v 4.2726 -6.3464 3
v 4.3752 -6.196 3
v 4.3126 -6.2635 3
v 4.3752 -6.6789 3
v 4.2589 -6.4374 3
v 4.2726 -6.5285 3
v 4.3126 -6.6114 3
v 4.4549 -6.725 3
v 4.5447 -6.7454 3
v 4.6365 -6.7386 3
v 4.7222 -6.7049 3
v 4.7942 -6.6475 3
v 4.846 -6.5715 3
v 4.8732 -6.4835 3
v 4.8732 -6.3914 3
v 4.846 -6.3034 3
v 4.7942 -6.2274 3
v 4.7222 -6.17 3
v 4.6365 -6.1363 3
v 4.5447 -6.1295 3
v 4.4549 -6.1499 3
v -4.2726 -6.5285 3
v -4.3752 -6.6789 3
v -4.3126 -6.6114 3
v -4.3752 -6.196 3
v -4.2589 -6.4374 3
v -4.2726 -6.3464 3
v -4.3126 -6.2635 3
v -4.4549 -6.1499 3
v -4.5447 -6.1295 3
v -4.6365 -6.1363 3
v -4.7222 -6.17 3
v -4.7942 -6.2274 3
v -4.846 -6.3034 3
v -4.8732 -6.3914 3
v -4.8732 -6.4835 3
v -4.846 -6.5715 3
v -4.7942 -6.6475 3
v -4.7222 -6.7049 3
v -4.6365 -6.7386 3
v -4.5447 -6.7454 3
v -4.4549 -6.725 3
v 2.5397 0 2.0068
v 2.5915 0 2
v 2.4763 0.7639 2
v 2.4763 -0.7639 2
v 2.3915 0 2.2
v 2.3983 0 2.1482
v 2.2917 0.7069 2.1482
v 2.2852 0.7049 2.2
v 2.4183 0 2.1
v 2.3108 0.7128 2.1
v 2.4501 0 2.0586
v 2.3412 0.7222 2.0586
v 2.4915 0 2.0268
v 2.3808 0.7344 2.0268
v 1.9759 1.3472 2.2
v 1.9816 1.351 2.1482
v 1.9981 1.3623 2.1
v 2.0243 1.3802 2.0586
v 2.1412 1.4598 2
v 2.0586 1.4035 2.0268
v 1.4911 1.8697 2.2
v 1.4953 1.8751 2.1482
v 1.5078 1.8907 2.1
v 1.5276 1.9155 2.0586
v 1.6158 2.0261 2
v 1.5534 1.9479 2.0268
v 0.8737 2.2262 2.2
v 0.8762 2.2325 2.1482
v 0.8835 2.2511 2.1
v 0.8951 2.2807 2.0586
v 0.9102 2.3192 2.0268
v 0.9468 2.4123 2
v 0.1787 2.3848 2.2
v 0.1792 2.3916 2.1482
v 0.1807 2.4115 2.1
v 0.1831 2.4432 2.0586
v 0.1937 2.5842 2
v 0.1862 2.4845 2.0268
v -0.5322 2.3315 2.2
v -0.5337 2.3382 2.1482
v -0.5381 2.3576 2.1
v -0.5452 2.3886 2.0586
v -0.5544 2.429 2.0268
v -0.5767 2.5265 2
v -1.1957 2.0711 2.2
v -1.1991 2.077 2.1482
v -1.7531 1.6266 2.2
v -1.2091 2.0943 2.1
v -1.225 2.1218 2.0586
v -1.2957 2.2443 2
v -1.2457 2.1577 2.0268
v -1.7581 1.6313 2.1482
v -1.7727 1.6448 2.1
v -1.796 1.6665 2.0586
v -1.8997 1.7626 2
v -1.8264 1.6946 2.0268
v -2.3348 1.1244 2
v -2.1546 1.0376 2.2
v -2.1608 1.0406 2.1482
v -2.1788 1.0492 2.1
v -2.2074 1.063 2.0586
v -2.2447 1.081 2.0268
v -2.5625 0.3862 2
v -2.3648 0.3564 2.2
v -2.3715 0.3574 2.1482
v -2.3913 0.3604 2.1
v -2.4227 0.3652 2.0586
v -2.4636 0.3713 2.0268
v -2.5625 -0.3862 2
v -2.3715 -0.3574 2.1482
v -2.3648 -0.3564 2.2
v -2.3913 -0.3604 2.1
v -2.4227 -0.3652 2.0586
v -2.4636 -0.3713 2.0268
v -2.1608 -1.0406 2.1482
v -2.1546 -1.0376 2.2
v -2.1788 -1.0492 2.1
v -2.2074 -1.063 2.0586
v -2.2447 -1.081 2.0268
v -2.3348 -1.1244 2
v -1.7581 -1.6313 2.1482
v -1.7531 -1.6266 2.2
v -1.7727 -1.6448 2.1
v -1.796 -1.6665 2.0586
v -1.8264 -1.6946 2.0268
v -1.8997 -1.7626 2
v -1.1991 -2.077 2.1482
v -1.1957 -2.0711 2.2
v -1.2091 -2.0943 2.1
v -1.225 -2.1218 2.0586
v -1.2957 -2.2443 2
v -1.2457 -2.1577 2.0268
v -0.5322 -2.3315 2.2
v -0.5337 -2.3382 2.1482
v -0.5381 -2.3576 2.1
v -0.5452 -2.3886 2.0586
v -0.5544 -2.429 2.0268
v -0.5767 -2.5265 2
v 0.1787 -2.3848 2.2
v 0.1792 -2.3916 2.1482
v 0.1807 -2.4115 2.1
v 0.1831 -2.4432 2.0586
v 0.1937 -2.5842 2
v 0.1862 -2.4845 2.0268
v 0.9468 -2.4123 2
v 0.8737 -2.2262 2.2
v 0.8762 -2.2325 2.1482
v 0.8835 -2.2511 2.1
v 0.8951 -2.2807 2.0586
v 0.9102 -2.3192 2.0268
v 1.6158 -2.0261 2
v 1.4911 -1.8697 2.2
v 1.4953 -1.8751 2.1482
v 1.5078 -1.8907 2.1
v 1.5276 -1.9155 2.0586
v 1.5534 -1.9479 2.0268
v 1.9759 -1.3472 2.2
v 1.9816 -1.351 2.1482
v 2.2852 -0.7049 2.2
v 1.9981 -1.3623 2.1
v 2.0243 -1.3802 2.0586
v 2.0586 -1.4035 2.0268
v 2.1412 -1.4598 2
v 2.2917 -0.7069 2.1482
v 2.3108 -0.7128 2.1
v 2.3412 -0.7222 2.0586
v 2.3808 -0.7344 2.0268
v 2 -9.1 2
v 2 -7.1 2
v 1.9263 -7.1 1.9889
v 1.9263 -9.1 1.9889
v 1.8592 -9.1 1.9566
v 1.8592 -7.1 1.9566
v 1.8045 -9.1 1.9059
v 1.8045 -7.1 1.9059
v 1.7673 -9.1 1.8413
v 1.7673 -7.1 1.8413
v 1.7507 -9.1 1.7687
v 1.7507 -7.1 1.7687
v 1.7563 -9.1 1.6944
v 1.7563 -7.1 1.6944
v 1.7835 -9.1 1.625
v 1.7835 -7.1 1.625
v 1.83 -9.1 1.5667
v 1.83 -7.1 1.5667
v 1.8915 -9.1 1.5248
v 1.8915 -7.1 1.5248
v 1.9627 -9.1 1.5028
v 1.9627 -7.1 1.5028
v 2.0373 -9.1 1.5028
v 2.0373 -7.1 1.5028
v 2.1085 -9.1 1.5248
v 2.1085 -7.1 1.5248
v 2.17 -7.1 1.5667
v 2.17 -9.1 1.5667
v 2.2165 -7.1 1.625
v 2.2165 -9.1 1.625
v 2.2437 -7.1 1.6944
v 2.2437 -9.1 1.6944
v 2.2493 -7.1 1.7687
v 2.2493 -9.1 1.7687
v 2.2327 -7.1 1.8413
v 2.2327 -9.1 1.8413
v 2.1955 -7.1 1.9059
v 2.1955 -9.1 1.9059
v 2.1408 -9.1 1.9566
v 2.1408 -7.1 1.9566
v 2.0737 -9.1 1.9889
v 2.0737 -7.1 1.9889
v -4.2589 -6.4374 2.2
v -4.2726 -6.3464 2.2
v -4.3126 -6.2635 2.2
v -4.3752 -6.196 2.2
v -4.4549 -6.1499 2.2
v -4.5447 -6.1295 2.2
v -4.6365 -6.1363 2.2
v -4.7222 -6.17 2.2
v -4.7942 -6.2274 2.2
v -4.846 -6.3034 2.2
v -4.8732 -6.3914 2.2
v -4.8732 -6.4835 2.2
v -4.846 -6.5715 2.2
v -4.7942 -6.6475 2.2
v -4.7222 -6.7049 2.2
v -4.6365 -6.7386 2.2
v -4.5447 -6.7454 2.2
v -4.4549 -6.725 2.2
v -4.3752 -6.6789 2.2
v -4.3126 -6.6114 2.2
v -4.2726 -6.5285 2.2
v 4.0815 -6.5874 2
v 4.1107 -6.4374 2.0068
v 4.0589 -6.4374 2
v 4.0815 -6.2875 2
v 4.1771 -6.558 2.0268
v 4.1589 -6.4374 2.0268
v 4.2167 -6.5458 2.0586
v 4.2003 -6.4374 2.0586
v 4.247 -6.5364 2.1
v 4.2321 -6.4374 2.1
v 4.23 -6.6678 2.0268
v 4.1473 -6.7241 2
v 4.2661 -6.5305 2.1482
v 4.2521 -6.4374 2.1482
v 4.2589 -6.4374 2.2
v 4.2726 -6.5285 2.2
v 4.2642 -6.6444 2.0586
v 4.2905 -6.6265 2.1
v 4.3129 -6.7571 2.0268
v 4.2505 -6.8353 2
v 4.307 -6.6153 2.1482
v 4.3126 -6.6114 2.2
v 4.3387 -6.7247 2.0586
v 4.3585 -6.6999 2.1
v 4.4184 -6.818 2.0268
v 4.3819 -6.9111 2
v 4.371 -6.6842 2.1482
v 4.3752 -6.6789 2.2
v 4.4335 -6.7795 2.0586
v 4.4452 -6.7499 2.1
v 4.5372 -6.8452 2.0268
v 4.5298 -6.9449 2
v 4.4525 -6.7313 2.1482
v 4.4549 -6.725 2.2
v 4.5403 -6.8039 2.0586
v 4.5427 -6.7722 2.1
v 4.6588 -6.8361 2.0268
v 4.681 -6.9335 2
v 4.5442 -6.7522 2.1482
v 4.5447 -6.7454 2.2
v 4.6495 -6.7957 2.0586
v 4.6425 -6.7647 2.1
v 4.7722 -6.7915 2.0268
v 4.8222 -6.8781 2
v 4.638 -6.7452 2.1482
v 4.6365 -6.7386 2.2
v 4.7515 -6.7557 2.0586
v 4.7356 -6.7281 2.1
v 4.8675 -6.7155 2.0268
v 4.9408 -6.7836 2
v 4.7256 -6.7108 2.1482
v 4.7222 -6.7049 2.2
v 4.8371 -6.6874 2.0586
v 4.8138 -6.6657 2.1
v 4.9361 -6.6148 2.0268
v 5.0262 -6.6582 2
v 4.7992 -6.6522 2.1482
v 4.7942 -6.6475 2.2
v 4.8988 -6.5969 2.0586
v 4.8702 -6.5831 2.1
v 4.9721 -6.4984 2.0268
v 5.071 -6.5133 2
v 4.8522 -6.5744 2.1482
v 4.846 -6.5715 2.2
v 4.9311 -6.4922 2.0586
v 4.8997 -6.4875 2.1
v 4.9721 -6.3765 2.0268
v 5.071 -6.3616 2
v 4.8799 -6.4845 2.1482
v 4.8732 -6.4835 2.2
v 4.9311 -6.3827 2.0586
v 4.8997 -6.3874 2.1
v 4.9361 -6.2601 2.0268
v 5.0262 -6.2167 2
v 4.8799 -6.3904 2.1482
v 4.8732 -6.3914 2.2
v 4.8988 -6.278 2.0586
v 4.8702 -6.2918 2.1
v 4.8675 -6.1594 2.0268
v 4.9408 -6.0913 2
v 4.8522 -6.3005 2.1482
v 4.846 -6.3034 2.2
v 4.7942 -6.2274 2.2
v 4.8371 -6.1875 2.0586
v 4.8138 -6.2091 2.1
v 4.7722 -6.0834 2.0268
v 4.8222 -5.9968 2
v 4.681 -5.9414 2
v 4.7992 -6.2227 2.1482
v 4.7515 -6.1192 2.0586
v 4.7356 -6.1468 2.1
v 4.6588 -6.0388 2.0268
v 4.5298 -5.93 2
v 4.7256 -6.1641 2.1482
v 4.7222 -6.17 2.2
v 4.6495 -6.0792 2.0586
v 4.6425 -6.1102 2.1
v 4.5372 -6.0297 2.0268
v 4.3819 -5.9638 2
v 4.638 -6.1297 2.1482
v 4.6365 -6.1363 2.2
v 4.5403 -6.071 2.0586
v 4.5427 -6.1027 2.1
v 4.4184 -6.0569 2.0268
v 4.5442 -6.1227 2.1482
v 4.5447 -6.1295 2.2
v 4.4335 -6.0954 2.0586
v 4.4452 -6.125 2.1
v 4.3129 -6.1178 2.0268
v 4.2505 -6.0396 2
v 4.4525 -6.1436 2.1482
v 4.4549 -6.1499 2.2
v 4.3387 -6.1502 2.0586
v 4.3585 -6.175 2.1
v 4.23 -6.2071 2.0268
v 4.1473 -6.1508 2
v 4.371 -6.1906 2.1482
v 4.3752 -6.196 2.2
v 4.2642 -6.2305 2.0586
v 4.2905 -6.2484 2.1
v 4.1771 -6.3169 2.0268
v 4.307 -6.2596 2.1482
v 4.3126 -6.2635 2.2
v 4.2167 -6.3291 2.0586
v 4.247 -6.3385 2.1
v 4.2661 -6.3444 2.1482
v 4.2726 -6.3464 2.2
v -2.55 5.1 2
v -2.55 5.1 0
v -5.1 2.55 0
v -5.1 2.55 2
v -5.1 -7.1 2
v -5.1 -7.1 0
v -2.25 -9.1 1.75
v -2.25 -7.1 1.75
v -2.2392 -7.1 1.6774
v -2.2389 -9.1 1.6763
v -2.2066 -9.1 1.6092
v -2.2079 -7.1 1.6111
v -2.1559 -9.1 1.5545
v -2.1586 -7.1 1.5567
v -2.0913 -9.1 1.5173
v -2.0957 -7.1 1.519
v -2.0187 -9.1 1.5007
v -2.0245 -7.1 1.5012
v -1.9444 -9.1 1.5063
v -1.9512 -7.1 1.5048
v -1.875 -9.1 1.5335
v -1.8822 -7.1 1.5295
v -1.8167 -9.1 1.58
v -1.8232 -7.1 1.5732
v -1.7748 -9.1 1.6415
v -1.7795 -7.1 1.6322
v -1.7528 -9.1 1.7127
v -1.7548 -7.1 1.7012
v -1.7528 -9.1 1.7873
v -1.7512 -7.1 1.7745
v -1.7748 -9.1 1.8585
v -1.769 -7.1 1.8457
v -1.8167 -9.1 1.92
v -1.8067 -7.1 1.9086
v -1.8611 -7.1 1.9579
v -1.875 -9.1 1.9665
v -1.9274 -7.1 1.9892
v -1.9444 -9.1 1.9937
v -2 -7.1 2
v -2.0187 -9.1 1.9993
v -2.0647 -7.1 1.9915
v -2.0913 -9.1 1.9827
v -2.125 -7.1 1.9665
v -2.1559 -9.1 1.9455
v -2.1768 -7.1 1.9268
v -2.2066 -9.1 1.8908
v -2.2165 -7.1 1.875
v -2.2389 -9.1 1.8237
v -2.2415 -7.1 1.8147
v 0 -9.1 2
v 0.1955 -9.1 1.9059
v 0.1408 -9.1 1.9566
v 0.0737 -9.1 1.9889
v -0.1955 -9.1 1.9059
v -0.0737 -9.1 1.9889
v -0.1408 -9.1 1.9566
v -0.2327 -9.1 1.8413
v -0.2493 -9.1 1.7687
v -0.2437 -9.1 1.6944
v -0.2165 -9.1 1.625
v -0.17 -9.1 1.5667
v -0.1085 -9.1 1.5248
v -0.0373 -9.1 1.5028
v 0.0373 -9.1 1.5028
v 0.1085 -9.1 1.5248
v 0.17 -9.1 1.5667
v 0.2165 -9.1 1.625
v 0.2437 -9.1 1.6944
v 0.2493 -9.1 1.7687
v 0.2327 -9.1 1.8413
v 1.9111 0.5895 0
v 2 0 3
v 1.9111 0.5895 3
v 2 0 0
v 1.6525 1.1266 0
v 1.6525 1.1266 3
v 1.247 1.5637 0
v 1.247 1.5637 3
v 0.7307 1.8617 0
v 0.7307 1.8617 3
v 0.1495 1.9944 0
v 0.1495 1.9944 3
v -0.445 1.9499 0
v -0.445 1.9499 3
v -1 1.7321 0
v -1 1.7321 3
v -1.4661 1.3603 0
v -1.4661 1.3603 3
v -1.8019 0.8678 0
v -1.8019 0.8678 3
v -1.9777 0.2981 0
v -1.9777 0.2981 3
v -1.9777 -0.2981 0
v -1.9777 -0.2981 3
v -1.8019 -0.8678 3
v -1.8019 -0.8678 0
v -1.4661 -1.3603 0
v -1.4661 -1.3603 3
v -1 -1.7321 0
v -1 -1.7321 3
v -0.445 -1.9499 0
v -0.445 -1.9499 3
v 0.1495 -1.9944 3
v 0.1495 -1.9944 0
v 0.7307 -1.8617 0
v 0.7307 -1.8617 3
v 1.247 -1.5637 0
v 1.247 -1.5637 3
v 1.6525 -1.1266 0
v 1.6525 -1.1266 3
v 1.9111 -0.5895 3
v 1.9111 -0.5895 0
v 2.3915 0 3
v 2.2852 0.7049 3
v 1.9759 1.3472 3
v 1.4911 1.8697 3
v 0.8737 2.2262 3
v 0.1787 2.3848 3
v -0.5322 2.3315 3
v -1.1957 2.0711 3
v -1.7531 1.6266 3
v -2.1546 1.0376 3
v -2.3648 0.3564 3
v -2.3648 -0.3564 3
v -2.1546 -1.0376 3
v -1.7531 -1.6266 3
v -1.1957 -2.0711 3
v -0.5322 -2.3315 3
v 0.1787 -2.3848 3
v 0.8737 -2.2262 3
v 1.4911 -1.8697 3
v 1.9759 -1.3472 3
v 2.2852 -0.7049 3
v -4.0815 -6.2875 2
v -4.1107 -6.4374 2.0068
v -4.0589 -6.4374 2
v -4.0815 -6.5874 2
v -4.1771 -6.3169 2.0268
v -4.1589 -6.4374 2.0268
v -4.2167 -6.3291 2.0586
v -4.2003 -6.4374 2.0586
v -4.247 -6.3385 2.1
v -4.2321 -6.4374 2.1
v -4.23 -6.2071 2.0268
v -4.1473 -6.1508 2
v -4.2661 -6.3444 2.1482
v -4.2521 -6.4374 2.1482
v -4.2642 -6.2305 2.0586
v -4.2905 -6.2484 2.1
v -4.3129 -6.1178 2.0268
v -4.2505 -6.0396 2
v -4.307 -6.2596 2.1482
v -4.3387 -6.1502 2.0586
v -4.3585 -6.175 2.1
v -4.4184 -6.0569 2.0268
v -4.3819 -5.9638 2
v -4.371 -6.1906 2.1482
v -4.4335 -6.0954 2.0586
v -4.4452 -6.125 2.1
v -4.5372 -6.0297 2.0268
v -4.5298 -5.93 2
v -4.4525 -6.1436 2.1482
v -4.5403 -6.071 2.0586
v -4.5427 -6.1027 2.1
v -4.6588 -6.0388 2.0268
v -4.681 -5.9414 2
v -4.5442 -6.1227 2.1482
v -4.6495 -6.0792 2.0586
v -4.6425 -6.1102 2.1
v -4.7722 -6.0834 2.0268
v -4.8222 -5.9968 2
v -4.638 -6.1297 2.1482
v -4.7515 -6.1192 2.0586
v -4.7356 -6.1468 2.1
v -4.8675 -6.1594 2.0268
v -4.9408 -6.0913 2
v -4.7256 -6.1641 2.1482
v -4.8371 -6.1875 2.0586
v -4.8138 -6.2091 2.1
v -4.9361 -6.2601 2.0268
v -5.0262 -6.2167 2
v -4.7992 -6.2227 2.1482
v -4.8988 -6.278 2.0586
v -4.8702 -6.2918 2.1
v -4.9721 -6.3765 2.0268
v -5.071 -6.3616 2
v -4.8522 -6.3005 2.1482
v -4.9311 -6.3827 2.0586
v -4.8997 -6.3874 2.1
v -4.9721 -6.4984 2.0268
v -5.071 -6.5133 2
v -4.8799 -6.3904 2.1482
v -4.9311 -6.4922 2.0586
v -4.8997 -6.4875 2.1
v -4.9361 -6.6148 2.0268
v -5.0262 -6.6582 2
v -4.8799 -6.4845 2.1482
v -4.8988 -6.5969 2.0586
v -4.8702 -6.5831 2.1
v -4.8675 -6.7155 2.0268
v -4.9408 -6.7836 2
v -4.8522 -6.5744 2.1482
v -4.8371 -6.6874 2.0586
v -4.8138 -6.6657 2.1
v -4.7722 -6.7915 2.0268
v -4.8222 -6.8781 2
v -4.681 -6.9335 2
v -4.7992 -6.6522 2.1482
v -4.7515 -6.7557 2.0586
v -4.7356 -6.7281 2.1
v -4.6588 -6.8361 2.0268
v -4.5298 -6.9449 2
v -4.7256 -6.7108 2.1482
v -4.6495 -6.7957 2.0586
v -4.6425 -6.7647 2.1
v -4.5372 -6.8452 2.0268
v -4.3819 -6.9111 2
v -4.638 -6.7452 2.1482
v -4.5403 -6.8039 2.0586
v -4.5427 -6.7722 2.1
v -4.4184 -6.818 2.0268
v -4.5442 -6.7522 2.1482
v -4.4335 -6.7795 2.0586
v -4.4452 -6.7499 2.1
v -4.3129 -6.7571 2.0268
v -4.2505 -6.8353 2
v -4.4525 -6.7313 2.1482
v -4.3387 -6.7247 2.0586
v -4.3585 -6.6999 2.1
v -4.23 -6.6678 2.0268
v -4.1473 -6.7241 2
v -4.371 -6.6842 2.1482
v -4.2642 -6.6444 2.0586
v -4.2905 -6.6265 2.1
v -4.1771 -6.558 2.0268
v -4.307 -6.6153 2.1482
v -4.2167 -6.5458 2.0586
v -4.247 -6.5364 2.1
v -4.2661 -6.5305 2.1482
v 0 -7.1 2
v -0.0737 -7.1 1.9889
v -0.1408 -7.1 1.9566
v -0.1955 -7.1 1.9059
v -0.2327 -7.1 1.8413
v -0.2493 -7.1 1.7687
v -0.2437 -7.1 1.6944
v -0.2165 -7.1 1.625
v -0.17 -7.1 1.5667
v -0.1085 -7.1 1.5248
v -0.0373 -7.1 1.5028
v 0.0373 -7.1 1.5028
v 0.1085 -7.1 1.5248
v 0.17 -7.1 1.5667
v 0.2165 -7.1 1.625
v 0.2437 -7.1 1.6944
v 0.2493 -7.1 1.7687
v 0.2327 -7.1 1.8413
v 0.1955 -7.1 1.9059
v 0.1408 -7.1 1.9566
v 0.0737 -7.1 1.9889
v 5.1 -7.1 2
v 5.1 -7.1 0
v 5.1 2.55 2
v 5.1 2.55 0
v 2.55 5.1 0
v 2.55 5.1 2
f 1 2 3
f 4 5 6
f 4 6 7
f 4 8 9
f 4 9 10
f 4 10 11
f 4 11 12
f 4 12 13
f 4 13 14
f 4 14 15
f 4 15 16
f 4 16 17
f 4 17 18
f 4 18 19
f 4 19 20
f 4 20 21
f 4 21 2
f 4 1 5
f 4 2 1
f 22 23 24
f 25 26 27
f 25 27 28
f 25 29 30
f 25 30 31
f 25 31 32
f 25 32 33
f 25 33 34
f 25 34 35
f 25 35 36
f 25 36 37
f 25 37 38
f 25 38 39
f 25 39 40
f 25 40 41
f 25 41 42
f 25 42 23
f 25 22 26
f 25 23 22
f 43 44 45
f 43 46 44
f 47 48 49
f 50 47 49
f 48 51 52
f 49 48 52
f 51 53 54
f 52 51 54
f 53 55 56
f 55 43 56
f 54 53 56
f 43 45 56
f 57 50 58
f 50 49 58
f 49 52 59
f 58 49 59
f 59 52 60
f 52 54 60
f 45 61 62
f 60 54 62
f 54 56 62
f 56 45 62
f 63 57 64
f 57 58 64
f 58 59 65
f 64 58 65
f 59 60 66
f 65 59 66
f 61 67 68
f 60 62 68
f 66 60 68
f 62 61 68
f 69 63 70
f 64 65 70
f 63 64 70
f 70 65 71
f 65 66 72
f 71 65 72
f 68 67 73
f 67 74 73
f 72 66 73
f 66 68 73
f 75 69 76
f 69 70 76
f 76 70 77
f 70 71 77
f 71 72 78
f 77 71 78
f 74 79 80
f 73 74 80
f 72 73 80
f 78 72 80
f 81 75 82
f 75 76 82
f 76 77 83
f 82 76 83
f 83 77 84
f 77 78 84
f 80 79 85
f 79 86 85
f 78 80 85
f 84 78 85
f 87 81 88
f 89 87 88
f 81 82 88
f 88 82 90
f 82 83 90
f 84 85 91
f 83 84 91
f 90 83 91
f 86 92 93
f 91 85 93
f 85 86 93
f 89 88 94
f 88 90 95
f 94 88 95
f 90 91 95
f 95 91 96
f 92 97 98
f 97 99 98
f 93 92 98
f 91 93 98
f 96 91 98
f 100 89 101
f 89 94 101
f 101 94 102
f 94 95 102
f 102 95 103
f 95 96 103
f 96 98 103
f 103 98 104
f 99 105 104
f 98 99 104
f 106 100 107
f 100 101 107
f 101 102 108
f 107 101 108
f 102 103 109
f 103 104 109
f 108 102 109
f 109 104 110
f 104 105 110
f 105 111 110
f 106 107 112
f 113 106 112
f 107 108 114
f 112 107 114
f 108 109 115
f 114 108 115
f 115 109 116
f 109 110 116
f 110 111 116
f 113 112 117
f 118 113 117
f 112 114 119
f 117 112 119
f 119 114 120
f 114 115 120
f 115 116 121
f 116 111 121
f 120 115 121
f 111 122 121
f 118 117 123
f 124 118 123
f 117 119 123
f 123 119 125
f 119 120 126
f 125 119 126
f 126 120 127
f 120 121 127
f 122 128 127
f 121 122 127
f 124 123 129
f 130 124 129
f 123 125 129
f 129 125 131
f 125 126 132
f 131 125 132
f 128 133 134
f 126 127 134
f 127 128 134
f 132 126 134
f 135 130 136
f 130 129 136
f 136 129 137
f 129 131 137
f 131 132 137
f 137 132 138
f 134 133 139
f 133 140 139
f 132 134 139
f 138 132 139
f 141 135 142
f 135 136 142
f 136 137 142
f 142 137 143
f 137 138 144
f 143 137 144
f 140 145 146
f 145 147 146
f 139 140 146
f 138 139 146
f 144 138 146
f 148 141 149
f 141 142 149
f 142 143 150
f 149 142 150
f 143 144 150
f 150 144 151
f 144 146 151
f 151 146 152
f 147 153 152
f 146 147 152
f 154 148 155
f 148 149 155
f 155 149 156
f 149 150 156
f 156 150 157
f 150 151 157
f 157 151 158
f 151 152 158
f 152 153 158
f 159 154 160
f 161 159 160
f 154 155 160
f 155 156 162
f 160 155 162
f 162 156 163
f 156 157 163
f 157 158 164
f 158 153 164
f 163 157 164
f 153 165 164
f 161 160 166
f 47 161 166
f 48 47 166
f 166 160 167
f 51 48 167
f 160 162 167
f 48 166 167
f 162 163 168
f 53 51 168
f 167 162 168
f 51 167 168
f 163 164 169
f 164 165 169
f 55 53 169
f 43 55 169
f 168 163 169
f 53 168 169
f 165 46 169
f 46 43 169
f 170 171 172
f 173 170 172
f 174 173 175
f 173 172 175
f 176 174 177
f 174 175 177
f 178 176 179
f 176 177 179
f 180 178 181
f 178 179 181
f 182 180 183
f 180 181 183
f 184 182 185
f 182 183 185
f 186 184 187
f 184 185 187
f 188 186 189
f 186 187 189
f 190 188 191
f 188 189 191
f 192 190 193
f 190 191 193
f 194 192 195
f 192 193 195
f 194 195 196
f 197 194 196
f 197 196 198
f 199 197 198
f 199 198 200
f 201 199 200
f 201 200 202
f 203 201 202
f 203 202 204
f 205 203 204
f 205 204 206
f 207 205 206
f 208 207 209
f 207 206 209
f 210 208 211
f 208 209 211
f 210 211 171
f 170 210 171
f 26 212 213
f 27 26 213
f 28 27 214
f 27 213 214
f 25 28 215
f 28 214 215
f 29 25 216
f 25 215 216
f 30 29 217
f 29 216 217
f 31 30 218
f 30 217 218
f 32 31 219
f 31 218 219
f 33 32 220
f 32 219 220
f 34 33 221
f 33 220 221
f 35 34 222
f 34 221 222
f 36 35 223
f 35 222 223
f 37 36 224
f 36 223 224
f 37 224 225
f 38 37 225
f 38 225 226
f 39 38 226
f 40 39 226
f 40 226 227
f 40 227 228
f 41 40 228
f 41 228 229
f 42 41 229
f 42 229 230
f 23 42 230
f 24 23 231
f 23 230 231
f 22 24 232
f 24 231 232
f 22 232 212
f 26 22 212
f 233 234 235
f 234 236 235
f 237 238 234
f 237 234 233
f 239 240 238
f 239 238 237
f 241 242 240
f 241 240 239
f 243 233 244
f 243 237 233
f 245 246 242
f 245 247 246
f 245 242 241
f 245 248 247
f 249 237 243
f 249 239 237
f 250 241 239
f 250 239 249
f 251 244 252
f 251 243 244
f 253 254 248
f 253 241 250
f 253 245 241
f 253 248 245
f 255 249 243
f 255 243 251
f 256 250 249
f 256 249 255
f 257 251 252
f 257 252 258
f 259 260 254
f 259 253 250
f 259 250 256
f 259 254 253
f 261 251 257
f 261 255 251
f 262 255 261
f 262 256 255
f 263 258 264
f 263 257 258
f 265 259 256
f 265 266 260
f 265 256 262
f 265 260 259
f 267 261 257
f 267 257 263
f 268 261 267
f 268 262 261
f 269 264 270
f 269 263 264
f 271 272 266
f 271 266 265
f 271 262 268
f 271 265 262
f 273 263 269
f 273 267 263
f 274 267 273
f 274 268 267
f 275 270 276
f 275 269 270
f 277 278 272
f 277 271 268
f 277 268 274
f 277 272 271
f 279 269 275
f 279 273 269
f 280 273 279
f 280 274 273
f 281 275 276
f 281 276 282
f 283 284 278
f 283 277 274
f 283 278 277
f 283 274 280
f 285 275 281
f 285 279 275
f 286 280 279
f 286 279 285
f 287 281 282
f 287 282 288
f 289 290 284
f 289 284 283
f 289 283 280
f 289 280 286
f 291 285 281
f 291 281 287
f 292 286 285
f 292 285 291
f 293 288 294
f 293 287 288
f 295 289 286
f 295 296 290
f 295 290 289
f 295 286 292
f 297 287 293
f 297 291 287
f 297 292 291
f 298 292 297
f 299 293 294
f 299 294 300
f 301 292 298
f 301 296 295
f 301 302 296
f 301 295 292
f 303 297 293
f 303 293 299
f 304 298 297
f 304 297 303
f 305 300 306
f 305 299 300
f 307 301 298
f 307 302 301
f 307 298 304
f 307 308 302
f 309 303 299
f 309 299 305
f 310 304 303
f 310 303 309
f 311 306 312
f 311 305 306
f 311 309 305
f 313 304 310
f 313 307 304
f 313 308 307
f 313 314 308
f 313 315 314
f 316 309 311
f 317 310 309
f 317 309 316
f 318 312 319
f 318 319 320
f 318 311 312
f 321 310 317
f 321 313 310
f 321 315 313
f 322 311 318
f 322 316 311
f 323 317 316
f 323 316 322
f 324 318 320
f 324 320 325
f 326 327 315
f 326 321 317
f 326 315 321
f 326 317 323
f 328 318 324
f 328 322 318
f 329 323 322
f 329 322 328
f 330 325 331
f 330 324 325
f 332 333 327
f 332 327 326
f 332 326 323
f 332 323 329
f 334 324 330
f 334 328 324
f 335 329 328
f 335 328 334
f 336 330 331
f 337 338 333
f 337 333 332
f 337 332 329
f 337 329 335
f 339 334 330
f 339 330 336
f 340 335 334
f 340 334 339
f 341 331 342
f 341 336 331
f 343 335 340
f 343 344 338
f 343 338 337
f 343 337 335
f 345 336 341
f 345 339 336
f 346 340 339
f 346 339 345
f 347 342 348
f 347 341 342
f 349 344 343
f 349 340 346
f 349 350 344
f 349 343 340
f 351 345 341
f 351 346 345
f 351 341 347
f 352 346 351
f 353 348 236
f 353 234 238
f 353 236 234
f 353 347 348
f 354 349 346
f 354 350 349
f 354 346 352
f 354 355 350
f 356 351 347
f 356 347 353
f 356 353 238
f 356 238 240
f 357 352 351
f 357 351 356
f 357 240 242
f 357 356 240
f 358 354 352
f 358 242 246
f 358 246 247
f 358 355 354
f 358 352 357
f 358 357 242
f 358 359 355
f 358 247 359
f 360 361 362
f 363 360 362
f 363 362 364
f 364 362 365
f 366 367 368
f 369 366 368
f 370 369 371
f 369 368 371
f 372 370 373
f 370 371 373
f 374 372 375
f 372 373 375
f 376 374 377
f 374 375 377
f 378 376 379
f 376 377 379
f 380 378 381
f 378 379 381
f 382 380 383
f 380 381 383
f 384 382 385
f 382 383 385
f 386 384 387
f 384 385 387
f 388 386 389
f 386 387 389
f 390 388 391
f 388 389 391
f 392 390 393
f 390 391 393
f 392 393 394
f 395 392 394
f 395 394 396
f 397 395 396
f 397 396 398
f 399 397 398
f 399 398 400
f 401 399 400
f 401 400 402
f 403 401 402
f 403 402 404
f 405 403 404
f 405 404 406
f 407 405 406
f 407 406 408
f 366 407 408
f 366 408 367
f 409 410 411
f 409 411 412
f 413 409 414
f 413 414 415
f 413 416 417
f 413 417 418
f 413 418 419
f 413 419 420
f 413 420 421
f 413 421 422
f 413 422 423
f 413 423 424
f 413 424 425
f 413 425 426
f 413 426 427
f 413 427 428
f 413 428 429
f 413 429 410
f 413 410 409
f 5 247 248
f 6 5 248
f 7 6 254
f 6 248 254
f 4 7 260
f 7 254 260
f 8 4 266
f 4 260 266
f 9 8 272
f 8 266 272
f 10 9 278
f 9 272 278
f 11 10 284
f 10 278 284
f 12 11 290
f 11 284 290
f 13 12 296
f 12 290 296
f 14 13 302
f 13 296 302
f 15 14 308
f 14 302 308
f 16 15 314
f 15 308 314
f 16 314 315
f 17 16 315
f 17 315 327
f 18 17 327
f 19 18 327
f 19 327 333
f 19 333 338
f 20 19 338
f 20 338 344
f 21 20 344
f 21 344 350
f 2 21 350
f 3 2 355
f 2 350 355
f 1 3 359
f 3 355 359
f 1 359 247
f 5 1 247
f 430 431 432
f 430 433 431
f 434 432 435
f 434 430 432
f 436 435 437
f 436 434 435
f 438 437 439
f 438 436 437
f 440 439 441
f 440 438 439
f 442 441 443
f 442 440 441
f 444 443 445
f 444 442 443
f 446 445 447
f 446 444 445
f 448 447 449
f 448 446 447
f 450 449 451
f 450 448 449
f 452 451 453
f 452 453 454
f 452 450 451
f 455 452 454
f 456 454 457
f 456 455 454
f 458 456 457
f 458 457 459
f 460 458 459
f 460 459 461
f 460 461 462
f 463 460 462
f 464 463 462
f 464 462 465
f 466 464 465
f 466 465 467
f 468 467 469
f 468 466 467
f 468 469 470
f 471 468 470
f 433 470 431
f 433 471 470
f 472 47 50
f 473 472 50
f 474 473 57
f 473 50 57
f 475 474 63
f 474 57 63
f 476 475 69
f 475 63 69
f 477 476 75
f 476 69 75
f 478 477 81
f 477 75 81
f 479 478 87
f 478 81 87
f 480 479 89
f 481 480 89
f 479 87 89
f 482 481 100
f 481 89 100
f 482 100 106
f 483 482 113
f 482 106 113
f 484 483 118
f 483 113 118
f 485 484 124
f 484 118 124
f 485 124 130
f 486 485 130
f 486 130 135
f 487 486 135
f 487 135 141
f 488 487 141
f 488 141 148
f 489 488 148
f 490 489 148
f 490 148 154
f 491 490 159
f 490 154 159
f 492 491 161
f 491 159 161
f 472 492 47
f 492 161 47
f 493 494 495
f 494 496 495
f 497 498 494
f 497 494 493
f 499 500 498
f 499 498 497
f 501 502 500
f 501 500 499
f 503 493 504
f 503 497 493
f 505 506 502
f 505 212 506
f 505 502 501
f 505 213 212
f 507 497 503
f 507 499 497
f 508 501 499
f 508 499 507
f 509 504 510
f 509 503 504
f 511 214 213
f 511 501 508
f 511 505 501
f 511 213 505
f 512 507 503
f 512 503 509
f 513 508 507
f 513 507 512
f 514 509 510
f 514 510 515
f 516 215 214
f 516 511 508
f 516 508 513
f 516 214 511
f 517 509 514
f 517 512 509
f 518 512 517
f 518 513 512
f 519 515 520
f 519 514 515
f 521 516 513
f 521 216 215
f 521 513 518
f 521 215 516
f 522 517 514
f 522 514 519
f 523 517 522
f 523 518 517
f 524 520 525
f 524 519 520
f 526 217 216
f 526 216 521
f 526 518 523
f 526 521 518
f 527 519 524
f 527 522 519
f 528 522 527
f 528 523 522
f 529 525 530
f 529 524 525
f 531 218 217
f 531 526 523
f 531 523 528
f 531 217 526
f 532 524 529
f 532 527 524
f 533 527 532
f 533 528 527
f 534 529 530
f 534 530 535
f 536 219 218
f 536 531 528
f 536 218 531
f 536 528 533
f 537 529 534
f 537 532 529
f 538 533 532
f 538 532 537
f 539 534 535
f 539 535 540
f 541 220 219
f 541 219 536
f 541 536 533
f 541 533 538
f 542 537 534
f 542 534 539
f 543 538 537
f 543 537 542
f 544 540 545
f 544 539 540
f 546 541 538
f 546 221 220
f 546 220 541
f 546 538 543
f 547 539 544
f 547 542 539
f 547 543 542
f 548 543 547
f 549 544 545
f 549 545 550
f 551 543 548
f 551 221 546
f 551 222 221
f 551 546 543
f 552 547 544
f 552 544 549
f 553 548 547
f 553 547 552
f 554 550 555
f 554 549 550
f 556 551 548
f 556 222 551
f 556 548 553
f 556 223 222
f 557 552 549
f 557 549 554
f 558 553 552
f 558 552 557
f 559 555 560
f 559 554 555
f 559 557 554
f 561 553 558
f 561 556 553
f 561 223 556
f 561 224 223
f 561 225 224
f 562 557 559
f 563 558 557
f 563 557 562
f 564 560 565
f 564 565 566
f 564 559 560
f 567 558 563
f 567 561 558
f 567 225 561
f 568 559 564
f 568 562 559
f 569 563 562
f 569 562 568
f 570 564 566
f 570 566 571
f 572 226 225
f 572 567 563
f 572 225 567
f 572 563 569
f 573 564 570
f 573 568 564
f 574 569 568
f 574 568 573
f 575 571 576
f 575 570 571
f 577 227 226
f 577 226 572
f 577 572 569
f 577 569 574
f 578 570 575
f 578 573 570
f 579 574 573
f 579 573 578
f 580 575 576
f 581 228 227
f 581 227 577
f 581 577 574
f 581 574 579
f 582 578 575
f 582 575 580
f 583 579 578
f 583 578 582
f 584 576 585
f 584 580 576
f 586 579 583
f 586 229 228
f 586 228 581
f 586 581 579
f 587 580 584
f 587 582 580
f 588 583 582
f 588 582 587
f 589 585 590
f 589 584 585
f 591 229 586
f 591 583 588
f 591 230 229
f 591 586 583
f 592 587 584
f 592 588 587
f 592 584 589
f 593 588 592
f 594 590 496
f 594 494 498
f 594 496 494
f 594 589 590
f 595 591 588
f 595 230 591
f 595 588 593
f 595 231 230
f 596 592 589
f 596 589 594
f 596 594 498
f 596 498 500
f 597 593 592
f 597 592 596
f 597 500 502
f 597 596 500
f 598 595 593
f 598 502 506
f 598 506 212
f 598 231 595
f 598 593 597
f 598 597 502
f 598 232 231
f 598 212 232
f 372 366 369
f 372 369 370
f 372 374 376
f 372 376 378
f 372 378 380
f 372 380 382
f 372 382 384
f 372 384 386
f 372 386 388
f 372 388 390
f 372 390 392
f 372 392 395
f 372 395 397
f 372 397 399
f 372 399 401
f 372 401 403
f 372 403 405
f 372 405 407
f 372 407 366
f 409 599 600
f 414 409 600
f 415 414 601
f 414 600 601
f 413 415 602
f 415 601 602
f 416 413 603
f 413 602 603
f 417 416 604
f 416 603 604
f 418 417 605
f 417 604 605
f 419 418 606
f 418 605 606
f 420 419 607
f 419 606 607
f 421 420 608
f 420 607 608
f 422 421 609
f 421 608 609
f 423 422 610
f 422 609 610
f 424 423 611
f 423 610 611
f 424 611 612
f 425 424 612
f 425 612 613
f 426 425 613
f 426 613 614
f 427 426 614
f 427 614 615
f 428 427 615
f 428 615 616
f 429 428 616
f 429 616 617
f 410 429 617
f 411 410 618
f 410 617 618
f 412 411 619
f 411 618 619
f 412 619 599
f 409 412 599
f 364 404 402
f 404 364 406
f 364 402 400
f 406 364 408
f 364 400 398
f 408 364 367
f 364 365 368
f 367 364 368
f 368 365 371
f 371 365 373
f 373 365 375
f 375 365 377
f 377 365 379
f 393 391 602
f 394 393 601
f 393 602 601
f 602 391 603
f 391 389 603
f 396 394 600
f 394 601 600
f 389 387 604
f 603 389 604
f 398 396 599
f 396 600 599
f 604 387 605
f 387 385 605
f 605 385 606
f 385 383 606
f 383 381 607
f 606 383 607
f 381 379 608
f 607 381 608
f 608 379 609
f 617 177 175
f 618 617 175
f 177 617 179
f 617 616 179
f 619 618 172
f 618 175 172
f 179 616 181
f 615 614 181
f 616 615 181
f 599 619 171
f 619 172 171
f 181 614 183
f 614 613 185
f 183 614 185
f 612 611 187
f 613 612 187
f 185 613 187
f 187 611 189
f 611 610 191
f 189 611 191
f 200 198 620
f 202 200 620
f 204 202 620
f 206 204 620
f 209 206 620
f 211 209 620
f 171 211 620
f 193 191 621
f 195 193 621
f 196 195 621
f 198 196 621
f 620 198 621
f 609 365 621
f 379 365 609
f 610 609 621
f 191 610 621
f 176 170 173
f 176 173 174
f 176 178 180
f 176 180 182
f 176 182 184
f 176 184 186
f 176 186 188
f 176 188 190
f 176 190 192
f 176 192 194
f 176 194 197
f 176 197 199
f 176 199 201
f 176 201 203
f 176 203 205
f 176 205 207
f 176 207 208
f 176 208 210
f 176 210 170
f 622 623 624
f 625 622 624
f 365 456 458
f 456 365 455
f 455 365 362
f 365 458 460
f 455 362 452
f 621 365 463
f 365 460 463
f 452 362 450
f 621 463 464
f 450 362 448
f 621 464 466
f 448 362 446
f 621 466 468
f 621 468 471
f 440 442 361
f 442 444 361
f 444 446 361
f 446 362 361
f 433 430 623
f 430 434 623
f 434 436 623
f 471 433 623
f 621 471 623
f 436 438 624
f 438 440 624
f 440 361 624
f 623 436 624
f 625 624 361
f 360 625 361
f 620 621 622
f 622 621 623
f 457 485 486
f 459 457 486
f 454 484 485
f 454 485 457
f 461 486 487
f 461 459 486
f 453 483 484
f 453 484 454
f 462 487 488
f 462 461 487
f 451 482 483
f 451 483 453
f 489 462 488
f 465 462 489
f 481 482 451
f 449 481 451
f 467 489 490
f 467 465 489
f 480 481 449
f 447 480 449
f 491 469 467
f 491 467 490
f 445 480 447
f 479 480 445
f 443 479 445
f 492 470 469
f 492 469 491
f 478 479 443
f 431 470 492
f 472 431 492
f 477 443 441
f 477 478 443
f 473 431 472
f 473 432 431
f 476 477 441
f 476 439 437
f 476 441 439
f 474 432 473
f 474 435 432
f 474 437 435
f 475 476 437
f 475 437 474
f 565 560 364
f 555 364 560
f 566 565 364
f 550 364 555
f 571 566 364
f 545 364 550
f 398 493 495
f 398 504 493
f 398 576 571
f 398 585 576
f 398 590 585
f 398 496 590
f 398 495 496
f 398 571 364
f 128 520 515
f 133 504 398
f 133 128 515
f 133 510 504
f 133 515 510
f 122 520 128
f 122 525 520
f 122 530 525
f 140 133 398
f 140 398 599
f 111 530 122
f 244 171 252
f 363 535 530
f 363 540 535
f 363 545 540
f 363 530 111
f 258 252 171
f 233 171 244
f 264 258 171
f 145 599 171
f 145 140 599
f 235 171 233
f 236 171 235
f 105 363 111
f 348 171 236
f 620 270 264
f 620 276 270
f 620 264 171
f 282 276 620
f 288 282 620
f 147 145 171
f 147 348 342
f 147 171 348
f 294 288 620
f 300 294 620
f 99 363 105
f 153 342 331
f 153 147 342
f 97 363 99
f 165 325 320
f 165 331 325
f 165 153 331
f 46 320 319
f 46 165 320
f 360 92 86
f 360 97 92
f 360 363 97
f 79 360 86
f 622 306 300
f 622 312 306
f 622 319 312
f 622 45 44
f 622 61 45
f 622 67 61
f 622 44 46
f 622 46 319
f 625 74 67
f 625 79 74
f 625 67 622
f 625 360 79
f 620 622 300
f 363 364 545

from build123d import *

# Parameters (mm, degrees)
SKETCH1_R           = 2
BOSS_EXTRUDE1_DEPTH = 2
SKETCH2_R           = 2.391473365
SKETCH2_R_2         = 2
SKETCH2_R_3         = 0.308853545
BOSS_EXTRUDE2_DEPTH = 1
FILLET1_R           = 0.2
SKETCH3_R           = 0.25
BOSS_EXTRUDE3_DEPTH = 2


with BuildPart() as part:
    # Sketch1 → Boss-Extrude1 (new body)
    with BuildSketch(Plane.XY):
        Polygon((0, -7.1), (5.1, -7.1), (5.1, 0), (5.1, 2.55), (2.55, 5.1), (-2.55, 5.1), (-5.1, 2.55), (-5.1, 0), (-5.1, -7.1), align=None)
        Circle(SKETCH1_R, mode=Mode.SUBTRACT)
    extrude(amount=BOSS_EXTRUDE1_DEPTH)

    # Sketch2 → Boss-Extrude2 (add)
    # profile 1 of 3: a face of its own
    with BuildSketch(Plane.XY.offset(2)):
        Circle(SKETCH2_R)
        Circle(SKETCH2_R_2, mode=Mode.SUBTRACT)
    # profile 2 of 3: a face of its own
    with BuildSketch(Plane.XY.offset(2)):
        with Locations((-4.567781371, -6.437447931)):
            Circle(SKETCH2_R_3)
    # profile 3 of 3: a face of its own
    with BuildSketch(Plane.XY.offset(2)):
        with Locations(Location((4.567781371, -6.437447931, 0), (0, 0, 180))):
            Circle(SKETCH2_R_3)
    extrude(amount=BOSS_EXTRUDE2_DEPTH)

    # Fillet1
    fillet1_edges = [part.edges().sort_by_distance(p)[0] for p in [
        (-4.876634915, -6.437447931, 2),
        (4.876634915, -6.437447931, 2),
        (-2.391473365, 0, 2),
    ]]
    fillet(fillet1_edges, radius=FILLET1_R)

    # Sketch3 → Boss-Extrude3 (add)
    with BuildSketch(Plane.XZ.offset(7.1)):
        with Locations(Location((0, 1.75, 0), (0, 0, 90))):
            Circle(SKETCH3_R)
        with Locations(Location((2, 1.75, 0), (0, 0, 90))):
            Circle(SKETCH3_R)
        with Locations(Location((-2, 1.75, 0), (0, 0, 180))):
            Circle(SKETCH3_R)
    extrude(amount=BOSS_EXTRUDE3_DEPTH)


solid = part.part
